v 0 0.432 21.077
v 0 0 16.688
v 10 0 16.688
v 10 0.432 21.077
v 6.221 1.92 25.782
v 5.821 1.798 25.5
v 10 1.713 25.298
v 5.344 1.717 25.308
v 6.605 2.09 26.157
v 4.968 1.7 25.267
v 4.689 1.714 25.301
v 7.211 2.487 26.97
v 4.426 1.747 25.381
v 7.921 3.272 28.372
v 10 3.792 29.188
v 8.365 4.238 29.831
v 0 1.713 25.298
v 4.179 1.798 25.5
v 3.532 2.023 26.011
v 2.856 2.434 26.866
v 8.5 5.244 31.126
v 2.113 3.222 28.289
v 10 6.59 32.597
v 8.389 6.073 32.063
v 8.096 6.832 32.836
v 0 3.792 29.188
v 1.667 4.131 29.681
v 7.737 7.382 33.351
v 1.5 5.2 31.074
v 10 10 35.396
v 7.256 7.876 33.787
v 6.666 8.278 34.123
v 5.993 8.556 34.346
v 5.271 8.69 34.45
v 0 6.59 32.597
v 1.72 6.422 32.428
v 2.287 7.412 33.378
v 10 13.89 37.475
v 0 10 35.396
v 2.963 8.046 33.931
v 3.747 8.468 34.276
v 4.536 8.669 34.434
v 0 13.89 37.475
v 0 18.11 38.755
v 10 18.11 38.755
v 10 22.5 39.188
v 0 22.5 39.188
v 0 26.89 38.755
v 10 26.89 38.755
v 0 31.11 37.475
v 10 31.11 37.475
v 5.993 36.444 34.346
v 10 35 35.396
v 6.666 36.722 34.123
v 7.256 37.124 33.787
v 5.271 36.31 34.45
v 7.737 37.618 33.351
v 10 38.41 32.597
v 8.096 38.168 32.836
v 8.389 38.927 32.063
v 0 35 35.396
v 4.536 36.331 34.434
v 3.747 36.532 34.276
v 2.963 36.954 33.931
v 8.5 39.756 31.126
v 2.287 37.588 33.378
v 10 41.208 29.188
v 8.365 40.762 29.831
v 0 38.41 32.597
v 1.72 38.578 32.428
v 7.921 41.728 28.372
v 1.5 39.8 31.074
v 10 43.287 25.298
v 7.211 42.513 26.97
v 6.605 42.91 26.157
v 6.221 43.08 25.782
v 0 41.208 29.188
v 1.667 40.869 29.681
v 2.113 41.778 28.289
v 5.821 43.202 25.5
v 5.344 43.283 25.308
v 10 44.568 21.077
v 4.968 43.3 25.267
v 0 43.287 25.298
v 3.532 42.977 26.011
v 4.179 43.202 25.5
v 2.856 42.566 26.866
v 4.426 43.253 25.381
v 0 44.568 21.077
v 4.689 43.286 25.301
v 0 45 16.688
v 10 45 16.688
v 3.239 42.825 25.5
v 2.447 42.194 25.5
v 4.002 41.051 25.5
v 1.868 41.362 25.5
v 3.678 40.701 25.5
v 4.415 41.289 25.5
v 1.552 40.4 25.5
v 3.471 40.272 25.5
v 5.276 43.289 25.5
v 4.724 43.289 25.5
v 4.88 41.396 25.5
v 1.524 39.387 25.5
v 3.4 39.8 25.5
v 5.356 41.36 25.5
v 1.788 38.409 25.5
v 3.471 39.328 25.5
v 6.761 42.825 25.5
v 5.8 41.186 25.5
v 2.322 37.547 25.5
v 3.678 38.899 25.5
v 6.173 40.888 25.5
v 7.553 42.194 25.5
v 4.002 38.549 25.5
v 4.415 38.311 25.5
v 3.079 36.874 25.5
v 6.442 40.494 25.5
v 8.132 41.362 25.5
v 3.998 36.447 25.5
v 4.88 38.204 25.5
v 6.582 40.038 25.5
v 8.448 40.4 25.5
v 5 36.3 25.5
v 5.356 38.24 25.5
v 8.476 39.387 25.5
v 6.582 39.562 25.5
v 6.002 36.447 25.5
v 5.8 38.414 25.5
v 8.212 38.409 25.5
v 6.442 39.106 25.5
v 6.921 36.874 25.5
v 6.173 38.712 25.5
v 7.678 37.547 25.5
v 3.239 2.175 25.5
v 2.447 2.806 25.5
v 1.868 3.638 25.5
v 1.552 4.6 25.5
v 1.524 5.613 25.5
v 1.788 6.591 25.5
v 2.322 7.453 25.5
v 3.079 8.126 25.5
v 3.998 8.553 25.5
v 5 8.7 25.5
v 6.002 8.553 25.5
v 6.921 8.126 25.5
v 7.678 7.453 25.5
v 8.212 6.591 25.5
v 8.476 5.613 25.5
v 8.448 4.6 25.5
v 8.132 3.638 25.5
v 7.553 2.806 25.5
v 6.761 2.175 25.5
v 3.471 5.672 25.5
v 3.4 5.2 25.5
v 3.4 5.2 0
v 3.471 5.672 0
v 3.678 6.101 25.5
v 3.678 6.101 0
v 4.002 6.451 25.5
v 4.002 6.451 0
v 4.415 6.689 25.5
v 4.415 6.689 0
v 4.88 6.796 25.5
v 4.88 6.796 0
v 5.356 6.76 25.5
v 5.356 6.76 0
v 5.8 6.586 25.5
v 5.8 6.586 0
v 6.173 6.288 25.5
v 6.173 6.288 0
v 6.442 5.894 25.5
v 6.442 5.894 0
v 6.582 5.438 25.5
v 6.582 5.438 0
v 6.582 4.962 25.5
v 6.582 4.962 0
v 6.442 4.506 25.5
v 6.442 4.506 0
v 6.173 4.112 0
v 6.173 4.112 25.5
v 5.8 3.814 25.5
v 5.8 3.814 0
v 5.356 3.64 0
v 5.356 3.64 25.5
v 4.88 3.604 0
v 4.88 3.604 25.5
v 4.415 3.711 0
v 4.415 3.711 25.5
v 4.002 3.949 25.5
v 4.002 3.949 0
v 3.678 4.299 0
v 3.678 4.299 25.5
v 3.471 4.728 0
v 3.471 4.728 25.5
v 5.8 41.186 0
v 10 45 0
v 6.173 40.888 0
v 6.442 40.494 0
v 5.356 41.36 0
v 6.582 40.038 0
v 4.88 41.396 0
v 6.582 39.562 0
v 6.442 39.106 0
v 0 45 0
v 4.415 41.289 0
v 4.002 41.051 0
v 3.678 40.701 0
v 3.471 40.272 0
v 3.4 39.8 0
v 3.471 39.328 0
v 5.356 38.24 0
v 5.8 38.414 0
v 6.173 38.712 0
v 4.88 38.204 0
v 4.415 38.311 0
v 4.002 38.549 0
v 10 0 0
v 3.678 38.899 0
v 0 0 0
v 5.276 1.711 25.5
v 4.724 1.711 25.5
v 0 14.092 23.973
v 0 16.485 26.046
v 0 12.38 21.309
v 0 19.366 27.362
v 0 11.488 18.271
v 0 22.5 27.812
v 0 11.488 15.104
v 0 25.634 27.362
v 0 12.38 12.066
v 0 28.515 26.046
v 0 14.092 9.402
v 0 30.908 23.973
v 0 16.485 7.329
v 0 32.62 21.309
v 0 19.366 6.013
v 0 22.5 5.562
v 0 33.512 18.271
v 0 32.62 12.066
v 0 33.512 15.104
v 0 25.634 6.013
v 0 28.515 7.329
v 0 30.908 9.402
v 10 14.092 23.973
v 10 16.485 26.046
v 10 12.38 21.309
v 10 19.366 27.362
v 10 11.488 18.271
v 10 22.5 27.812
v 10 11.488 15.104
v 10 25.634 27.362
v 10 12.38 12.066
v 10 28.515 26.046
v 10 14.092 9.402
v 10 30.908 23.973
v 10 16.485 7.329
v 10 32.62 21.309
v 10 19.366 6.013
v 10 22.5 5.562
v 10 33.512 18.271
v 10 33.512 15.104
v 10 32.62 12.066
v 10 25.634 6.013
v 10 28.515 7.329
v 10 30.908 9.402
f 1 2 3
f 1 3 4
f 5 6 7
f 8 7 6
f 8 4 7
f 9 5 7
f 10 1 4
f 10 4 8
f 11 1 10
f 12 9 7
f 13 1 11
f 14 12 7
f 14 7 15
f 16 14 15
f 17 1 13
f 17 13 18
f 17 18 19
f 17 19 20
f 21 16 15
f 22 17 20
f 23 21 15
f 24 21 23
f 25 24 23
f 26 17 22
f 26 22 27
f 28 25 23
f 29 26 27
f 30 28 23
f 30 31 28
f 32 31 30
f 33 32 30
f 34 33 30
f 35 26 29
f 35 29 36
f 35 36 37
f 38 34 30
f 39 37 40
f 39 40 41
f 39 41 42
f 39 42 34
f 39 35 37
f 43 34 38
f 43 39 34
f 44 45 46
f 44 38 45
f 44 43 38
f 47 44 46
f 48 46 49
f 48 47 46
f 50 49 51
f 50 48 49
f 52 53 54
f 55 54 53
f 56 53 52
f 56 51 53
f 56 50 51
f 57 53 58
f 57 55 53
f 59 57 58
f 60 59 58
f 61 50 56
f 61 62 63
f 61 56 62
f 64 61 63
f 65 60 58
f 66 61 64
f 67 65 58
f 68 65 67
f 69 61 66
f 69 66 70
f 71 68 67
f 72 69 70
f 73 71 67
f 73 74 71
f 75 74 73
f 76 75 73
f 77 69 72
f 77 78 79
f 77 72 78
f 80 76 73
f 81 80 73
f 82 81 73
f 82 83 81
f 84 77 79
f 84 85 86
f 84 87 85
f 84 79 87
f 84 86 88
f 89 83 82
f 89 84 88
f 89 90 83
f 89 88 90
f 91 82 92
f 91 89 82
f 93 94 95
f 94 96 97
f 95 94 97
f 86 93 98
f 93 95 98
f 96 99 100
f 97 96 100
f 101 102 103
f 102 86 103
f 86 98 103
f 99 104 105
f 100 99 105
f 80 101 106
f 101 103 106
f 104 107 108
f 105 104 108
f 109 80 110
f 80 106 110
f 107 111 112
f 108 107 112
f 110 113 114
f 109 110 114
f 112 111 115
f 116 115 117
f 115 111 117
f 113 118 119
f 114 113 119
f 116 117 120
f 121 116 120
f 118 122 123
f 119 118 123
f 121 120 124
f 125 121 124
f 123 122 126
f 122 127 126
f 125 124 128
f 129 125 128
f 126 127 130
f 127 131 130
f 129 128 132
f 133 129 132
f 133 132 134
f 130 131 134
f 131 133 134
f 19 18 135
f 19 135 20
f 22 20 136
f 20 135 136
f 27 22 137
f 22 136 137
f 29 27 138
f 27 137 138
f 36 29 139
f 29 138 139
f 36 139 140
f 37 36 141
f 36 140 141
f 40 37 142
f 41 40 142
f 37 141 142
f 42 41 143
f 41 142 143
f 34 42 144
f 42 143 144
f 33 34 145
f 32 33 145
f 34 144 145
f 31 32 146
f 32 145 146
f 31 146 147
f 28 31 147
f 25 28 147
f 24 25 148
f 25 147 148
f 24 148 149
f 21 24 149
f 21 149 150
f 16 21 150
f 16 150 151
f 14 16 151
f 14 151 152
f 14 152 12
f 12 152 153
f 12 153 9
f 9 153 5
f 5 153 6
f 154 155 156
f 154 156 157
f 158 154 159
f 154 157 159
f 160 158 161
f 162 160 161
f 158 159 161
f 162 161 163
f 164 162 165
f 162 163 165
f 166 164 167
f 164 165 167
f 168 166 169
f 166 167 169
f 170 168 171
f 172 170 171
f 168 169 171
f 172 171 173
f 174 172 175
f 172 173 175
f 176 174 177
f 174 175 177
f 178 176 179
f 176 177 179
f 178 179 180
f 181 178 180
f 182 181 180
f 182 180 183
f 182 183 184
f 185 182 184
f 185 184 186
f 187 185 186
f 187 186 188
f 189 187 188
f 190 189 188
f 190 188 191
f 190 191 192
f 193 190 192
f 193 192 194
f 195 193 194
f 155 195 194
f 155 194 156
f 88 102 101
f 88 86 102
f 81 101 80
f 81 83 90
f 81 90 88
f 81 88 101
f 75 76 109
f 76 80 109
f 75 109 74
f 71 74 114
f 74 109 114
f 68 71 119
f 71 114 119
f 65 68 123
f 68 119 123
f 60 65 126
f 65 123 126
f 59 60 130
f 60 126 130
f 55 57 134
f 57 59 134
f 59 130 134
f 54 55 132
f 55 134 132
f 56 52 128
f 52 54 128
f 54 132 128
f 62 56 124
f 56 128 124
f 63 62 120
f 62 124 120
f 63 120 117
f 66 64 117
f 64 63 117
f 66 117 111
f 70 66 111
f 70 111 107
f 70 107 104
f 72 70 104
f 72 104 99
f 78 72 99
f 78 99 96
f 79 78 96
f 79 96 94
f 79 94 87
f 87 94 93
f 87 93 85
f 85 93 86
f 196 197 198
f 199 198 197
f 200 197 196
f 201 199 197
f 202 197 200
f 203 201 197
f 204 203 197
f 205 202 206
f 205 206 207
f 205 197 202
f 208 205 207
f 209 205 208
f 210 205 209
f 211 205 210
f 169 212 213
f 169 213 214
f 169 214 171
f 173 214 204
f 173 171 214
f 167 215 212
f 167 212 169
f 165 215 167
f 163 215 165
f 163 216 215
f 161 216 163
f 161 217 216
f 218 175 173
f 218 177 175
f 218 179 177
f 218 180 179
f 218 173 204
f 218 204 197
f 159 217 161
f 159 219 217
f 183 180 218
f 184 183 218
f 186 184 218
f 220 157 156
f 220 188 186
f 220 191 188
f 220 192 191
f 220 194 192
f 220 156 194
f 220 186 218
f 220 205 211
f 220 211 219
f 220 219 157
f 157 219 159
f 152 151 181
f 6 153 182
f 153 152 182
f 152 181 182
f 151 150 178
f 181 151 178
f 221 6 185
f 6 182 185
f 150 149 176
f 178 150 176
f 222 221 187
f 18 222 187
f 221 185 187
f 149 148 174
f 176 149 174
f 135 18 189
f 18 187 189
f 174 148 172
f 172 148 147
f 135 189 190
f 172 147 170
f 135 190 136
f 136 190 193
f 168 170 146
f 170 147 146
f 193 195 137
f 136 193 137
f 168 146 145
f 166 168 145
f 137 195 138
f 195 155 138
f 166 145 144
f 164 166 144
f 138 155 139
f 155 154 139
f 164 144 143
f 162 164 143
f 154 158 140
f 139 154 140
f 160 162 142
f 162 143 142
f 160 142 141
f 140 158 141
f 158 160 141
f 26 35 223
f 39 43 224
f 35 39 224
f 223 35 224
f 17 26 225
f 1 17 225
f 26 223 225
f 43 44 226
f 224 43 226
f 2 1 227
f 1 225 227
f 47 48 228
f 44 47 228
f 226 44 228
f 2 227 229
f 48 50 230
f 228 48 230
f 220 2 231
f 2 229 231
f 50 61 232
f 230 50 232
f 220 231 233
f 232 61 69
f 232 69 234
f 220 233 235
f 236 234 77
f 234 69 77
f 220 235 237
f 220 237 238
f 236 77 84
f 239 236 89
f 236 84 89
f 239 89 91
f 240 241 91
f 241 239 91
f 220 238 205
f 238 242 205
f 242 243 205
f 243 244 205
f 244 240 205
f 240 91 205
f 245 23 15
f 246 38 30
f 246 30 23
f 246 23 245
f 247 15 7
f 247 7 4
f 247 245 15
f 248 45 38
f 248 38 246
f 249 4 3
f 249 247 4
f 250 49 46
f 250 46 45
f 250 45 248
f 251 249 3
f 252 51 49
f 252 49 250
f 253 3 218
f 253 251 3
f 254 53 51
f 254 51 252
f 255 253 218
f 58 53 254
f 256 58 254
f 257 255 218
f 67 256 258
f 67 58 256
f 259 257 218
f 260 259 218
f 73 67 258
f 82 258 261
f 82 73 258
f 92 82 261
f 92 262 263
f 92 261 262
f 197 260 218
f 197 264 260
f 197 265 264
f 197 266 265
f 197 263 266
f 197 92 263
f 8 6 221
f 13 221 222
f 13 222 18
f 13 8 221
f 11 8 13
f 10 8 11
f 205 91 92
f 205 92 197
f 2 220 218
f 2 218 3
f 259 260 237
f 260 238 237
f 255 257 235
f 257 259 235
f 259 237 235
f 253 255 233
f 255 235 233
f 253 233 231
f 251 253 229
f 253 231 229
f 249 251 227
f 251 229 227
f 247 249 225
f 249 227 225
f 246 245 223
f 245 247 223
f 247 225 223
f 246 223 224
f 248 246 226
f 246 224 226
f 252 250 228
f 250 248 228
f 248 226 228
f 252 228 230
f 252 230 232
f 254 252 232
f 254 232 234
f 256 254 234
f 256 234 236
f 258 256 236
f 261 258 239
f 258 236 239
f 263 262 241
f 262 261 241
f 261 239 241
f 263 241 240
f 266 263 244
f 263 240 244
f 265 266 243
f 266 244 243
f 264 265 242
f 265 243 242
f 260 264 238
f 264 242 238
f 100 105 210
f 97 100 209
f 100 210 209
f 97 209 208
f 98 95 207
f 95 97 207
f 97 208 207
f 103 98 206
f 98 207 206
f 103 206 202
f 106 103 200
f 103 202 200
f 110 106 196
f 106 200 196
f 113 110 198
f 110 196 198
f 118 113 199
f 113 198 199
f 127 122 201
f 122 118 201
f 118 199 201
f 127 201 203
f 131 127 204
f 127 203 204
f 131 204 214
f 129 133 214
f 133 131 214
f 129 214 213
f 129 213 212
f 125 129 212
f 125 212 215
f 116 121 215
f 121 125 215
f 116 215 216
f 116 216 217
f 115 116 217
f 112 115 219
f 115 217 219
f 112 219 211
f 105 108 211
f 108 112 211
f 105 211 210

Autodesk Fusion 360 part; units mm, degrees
sketch "Sketch1" plane through (0, 0, 0) normal (1, 0, 0) x (0, 0, -1)
  line L0 (-16.6875, 45) -> (0, 45)
  line L1 (0, 45) -> (0, 0)
  line L2 (0, 0) -> (-16.6875, 0)
  arc A0 (-16.6875, 45) -> (-16.6875, 0) centre (-16.6875, 22.5) ccw
  circle A1 centre (-16.6875, 22.5) radius 11.125
  line L3 (0, 22.5) -> (-29, 22.5) construction
  circle A2 centre (-16.6875, 22.5) radius 9.125
  dimension "d1" = 22.25
  dimension "d2" = 45
  dimension "d3" = 16.6875
  dimension "d4" = -2
extrude "Extrude2" add sketch "Sketch1" along normal blind 10 contours L0 L1 L2 A0
sketch "Sketch2" plane through (0, 0, 0) normal (0, 0, -1) x (-1, 0, 0)
  line L0 (0, 45) -> (-10, 45)
  line L1 (-10, 0) -> (0, 0)
  circle A0 centre (-5, 5.2) radius 3.5
  line L2 (-5, 0) -> (-5, 4) construction
  circle A1 centre (-5, 5.2) radius 1.6
  line L3 (0, 0) -> (0, 45)
  line L4 (-10, 45) -> (-10, 0)
  dimension "d13" = 7
  dimension "d14" = 5.2
  dimension "d17" = 3.2
extrude "Extrude4" cut sketch "Sketch2" against normal blind 40 contours A0 | A1
extrude "Extrude5" add sketch "Sketch2" against normal blind 25.5 contours A0
ref_plane "WorkPlane1" through (5, 22.5, 8.3438) normal (0, -1, 0) x (0, 0, -1)
mirror "Mirror1" about plane through (5, 22.5, 8.3438) normal (0, -1, 0) of "Extrude4", "Extrude5"
equation "d3 = d1 * 0.75"
equation "d14 = d13 / 2 + 1.7 mm"
